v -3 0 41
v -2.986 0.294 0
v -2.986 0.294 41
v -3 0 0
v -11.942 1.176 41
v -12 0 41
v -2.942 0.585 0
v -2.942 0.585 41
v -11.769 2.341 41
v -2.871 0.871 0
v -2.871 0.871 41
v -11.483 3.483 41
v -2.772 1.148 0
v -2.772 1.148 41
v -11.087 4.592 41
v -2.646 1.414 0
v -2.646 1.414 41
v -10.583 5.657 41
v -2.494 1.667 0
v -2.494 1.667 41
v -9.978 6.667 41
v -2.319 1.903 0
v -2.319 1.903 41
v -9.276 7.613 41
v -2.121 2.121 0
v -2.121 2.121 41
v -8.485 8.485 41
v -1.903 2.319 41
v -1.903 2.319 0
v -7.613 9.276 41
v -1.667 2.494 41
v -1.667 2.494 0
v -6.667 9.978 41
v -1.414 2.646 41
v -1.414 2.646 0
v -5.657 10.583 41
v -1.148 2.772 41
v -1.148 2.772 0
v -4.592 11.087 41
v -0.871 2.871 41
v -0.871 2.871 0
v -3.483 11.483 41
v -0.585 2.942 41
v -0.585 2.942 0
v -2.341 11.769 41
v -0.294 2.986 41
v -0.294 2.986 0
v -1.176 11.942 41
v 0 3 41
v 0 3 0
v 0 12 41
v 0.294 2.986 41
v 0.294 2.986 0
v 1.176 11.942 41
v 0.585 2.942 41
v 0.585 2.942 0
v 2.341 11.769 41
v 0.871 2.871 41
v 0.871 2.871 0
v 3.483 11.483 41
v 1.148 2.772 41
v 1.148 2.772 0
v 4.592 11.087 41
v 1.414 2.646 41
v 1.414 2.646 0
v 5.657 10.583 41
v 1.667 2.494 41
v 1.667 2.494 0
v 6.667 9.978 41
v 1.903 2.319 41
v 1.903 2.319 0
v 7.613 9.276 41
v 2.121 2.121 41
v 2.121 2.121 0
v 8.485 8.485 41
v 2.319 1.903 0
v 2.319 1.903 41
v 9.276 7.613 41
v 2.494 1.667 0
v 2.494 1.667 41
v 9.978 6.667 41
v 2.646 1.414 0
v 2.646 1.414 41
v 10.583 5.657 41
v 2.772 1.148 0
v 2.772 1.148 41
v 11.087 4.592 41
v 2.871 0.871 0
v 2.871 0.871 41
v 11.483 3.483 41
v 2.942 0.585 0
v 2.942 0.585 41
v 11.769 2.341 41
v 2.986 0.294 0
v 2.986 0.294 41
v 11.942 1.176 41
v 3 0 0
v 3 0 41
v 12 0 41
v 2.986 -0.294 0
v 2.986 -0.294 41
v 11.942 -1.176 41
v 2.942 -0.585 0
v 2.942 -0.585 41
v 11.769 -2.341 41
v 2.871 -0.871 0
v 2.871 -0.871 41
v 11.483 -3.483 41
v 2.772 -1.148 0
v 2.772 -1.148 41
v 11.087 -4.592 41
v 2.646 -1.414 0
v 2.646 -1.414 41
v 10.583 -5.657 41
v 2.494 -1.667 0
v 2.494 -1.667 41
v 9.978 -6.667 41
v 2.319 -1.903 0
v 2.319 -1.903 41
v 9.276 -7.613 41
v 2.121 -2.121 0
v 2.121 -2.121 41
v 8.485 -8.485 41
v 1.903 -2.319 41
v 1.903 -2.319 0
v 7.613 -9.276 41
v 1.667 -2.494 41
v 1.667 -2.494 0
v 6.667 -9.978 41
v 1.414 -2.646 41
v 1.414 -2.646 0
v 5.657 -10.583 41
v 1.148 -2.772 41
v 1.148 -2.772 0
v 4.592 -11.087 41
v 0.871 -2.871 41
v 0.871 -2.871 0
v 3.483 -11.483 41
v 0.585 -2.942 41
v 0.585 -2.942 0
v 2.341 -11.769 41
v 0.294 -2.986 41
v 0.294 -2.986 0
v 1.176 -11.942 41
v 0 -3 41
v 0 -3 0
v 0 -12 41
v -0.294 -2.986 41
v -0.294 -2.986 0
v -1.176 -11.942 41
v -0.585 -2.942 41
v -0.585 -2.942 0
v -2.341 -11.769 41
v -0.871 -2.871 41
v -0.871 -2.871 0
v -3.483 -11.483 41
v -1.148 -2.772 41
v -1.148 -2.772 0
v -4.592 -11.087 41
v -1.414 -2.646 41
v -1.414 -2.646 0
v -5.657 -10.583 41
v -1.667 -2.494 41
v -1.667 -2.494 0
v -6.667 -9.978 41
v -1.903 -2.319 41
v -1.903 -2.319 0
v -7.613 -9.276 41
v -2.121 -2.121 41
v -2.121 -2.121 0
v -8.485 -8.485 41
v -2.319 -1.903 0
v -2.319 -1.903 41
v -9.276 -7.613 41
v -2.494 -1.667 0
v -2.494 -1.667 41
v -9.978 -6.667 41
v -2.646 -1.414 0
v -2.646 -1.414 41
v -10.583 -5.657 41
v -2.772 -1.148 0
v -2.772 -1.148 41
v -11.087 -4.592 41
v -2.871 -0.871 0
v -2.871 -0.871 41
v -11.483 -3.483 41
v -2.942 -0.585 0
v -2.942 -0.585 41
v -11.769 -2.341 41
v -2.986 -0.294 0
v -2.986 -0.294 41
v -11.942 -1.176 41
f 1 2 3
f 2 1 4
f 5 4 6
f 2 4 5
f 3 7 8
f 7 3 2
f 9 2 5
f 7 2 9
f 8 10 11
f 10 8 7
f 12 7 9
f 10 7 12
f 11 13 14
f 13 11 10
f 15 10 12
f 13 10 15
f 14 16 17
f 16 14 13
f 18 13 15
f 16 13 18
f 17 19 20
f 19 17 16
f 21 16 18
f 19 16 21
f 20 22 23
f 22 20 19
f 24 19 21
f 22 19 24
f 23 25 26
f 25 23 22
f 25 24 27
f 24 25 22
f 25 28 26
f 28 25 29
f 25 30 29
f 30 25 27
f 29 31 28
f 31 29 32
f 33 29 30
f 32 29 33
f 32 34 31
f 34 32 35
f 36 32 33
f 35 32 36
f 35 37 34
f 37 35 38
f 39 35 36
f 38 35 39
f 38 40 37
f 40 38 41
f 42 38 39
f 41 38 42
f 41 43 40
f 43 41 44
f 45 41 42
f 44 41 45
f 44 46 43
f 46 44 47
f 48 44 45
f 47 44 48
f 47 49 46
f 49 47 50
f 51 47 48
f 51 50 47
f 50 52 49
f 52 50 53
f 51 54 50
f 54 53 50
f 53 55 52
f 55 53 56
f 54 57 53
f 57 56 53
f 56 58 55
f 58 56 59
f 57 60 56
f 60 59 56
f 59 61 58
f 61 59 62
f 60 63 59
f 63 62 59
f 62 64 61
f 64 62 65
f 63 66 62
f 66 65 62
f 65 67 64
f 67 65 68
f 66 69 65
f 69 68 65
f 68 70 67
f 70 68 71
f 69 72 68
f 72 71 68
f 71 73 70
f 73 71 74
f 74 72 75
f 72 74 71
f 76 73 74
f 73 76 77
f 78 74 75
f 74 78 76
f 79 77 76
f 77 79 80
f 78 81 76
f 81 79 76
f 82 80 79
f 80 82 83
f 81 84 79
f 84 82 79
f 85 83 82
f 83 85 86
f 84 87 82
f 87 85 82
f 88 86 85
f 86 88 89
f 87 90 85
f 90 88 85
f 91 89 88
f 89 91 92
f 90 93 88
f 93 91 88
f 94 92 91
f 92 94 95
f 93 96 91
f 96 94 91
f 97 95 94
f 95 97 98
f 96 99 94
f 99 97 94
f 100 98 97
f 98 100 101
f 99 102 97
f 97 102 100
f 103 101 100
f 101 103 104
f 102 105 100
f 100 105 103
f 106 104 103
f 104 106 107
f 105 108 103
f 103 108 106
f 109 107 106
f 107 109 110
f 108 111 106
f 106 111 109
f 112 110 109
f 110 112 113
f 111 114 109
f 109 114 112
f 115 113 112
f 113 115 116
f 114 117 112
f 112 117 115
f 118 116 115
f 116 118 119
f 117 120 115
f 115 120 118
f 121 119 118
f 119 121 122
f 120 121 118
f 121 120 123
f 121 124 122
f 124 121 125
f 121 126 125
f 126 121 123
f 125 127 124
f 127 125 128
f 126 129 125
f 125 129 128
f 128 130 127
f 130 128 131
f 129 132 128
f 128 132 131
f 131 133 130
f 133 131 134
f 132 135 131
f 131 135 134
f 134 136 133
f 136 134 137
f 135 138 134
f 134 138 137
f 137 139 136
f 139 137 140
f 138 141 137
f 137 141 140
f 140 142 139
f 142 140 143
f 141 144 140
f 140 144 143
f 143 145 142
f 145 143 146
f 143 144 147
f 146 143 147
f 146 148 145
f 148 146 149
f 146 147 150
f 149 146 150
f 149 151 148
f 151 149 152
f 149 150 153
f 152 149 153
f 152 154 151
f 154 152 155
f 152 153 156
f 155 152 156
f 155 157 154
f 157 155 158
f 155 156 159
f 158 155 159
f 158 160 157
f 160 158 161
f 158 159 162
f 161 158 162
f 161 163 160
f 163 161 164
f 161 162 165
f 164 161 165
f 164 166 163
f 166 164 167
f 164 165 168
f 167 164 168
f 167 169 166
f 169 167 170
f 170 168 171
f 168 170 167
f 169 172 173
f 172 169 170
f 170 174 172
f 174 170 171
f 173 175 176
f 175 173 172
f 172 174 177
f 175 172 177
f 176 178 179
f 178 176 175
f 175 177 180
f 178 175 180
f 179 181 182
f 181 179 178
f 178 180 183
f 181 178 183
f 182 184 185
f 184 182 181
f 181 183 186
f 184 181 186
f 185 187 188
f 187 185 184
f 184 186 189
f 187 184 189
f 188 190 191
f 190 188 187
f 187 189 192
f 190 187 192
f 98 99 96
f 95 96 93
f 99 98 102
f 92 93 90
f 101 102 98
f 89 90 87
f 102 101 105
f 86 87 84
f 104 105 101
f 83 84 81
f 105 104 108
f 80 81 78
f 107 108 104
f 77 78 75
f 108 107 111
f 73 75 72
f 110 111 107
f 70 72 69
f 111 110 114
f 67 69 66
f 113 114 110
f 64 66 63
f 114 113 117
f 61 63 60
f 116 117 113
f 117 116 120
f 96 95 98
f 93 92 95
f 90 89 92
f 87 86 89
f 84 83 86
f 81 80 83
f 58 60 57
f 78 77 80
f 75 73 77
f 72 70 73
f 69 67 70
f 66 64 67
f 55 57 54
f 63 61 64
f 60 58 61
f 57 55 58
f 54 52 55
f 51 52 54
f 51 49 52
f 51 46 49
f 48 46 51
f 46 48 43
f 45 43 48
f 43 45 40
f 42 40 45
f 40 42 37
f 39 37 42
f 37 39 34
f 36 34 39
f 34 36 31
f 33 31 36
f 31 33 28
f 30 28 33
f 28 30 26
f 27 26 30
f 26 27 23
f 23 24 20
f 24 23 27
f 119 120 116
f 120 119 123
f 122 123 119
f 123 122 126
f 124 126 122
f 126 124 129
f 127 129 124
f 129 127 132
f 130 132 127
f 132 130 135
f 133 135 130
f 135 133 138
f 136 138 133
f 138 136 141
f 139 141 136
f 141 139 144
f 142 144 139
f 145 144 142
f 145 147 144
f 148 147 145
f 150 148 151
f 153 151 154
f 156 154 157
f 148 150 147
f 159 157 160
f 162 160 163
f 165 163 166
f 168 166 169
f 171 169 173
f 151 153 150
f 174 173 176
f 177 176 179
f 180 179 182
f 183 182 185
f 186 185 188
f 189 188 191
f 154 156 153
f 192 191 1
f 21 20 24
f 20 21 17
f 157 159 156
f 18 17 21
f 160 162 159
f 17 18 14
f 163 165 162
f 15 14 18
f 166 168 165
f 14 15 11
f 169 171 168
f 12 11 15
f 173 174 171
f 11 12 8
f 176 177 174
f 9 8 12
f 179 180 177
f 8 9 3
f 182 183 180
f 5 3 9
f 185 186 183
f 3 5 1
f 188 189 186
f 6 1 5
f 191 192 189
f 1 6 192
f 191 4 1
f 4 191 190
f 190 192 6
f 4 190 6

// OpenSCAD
// Built by bench/smallmodels/features/compiler.py from a list of features.
$fn = 64;
difference() {
  union() {
    translate([0, 0, 0]) rotate_extrude() polygon([[3, 0], [12, 41], [3, 41]]);
  }
  union() {
    translate([0, 0, -1]) rotate([0, 0, 0]) cylinder(d = 3, h = 43);
  }
}
